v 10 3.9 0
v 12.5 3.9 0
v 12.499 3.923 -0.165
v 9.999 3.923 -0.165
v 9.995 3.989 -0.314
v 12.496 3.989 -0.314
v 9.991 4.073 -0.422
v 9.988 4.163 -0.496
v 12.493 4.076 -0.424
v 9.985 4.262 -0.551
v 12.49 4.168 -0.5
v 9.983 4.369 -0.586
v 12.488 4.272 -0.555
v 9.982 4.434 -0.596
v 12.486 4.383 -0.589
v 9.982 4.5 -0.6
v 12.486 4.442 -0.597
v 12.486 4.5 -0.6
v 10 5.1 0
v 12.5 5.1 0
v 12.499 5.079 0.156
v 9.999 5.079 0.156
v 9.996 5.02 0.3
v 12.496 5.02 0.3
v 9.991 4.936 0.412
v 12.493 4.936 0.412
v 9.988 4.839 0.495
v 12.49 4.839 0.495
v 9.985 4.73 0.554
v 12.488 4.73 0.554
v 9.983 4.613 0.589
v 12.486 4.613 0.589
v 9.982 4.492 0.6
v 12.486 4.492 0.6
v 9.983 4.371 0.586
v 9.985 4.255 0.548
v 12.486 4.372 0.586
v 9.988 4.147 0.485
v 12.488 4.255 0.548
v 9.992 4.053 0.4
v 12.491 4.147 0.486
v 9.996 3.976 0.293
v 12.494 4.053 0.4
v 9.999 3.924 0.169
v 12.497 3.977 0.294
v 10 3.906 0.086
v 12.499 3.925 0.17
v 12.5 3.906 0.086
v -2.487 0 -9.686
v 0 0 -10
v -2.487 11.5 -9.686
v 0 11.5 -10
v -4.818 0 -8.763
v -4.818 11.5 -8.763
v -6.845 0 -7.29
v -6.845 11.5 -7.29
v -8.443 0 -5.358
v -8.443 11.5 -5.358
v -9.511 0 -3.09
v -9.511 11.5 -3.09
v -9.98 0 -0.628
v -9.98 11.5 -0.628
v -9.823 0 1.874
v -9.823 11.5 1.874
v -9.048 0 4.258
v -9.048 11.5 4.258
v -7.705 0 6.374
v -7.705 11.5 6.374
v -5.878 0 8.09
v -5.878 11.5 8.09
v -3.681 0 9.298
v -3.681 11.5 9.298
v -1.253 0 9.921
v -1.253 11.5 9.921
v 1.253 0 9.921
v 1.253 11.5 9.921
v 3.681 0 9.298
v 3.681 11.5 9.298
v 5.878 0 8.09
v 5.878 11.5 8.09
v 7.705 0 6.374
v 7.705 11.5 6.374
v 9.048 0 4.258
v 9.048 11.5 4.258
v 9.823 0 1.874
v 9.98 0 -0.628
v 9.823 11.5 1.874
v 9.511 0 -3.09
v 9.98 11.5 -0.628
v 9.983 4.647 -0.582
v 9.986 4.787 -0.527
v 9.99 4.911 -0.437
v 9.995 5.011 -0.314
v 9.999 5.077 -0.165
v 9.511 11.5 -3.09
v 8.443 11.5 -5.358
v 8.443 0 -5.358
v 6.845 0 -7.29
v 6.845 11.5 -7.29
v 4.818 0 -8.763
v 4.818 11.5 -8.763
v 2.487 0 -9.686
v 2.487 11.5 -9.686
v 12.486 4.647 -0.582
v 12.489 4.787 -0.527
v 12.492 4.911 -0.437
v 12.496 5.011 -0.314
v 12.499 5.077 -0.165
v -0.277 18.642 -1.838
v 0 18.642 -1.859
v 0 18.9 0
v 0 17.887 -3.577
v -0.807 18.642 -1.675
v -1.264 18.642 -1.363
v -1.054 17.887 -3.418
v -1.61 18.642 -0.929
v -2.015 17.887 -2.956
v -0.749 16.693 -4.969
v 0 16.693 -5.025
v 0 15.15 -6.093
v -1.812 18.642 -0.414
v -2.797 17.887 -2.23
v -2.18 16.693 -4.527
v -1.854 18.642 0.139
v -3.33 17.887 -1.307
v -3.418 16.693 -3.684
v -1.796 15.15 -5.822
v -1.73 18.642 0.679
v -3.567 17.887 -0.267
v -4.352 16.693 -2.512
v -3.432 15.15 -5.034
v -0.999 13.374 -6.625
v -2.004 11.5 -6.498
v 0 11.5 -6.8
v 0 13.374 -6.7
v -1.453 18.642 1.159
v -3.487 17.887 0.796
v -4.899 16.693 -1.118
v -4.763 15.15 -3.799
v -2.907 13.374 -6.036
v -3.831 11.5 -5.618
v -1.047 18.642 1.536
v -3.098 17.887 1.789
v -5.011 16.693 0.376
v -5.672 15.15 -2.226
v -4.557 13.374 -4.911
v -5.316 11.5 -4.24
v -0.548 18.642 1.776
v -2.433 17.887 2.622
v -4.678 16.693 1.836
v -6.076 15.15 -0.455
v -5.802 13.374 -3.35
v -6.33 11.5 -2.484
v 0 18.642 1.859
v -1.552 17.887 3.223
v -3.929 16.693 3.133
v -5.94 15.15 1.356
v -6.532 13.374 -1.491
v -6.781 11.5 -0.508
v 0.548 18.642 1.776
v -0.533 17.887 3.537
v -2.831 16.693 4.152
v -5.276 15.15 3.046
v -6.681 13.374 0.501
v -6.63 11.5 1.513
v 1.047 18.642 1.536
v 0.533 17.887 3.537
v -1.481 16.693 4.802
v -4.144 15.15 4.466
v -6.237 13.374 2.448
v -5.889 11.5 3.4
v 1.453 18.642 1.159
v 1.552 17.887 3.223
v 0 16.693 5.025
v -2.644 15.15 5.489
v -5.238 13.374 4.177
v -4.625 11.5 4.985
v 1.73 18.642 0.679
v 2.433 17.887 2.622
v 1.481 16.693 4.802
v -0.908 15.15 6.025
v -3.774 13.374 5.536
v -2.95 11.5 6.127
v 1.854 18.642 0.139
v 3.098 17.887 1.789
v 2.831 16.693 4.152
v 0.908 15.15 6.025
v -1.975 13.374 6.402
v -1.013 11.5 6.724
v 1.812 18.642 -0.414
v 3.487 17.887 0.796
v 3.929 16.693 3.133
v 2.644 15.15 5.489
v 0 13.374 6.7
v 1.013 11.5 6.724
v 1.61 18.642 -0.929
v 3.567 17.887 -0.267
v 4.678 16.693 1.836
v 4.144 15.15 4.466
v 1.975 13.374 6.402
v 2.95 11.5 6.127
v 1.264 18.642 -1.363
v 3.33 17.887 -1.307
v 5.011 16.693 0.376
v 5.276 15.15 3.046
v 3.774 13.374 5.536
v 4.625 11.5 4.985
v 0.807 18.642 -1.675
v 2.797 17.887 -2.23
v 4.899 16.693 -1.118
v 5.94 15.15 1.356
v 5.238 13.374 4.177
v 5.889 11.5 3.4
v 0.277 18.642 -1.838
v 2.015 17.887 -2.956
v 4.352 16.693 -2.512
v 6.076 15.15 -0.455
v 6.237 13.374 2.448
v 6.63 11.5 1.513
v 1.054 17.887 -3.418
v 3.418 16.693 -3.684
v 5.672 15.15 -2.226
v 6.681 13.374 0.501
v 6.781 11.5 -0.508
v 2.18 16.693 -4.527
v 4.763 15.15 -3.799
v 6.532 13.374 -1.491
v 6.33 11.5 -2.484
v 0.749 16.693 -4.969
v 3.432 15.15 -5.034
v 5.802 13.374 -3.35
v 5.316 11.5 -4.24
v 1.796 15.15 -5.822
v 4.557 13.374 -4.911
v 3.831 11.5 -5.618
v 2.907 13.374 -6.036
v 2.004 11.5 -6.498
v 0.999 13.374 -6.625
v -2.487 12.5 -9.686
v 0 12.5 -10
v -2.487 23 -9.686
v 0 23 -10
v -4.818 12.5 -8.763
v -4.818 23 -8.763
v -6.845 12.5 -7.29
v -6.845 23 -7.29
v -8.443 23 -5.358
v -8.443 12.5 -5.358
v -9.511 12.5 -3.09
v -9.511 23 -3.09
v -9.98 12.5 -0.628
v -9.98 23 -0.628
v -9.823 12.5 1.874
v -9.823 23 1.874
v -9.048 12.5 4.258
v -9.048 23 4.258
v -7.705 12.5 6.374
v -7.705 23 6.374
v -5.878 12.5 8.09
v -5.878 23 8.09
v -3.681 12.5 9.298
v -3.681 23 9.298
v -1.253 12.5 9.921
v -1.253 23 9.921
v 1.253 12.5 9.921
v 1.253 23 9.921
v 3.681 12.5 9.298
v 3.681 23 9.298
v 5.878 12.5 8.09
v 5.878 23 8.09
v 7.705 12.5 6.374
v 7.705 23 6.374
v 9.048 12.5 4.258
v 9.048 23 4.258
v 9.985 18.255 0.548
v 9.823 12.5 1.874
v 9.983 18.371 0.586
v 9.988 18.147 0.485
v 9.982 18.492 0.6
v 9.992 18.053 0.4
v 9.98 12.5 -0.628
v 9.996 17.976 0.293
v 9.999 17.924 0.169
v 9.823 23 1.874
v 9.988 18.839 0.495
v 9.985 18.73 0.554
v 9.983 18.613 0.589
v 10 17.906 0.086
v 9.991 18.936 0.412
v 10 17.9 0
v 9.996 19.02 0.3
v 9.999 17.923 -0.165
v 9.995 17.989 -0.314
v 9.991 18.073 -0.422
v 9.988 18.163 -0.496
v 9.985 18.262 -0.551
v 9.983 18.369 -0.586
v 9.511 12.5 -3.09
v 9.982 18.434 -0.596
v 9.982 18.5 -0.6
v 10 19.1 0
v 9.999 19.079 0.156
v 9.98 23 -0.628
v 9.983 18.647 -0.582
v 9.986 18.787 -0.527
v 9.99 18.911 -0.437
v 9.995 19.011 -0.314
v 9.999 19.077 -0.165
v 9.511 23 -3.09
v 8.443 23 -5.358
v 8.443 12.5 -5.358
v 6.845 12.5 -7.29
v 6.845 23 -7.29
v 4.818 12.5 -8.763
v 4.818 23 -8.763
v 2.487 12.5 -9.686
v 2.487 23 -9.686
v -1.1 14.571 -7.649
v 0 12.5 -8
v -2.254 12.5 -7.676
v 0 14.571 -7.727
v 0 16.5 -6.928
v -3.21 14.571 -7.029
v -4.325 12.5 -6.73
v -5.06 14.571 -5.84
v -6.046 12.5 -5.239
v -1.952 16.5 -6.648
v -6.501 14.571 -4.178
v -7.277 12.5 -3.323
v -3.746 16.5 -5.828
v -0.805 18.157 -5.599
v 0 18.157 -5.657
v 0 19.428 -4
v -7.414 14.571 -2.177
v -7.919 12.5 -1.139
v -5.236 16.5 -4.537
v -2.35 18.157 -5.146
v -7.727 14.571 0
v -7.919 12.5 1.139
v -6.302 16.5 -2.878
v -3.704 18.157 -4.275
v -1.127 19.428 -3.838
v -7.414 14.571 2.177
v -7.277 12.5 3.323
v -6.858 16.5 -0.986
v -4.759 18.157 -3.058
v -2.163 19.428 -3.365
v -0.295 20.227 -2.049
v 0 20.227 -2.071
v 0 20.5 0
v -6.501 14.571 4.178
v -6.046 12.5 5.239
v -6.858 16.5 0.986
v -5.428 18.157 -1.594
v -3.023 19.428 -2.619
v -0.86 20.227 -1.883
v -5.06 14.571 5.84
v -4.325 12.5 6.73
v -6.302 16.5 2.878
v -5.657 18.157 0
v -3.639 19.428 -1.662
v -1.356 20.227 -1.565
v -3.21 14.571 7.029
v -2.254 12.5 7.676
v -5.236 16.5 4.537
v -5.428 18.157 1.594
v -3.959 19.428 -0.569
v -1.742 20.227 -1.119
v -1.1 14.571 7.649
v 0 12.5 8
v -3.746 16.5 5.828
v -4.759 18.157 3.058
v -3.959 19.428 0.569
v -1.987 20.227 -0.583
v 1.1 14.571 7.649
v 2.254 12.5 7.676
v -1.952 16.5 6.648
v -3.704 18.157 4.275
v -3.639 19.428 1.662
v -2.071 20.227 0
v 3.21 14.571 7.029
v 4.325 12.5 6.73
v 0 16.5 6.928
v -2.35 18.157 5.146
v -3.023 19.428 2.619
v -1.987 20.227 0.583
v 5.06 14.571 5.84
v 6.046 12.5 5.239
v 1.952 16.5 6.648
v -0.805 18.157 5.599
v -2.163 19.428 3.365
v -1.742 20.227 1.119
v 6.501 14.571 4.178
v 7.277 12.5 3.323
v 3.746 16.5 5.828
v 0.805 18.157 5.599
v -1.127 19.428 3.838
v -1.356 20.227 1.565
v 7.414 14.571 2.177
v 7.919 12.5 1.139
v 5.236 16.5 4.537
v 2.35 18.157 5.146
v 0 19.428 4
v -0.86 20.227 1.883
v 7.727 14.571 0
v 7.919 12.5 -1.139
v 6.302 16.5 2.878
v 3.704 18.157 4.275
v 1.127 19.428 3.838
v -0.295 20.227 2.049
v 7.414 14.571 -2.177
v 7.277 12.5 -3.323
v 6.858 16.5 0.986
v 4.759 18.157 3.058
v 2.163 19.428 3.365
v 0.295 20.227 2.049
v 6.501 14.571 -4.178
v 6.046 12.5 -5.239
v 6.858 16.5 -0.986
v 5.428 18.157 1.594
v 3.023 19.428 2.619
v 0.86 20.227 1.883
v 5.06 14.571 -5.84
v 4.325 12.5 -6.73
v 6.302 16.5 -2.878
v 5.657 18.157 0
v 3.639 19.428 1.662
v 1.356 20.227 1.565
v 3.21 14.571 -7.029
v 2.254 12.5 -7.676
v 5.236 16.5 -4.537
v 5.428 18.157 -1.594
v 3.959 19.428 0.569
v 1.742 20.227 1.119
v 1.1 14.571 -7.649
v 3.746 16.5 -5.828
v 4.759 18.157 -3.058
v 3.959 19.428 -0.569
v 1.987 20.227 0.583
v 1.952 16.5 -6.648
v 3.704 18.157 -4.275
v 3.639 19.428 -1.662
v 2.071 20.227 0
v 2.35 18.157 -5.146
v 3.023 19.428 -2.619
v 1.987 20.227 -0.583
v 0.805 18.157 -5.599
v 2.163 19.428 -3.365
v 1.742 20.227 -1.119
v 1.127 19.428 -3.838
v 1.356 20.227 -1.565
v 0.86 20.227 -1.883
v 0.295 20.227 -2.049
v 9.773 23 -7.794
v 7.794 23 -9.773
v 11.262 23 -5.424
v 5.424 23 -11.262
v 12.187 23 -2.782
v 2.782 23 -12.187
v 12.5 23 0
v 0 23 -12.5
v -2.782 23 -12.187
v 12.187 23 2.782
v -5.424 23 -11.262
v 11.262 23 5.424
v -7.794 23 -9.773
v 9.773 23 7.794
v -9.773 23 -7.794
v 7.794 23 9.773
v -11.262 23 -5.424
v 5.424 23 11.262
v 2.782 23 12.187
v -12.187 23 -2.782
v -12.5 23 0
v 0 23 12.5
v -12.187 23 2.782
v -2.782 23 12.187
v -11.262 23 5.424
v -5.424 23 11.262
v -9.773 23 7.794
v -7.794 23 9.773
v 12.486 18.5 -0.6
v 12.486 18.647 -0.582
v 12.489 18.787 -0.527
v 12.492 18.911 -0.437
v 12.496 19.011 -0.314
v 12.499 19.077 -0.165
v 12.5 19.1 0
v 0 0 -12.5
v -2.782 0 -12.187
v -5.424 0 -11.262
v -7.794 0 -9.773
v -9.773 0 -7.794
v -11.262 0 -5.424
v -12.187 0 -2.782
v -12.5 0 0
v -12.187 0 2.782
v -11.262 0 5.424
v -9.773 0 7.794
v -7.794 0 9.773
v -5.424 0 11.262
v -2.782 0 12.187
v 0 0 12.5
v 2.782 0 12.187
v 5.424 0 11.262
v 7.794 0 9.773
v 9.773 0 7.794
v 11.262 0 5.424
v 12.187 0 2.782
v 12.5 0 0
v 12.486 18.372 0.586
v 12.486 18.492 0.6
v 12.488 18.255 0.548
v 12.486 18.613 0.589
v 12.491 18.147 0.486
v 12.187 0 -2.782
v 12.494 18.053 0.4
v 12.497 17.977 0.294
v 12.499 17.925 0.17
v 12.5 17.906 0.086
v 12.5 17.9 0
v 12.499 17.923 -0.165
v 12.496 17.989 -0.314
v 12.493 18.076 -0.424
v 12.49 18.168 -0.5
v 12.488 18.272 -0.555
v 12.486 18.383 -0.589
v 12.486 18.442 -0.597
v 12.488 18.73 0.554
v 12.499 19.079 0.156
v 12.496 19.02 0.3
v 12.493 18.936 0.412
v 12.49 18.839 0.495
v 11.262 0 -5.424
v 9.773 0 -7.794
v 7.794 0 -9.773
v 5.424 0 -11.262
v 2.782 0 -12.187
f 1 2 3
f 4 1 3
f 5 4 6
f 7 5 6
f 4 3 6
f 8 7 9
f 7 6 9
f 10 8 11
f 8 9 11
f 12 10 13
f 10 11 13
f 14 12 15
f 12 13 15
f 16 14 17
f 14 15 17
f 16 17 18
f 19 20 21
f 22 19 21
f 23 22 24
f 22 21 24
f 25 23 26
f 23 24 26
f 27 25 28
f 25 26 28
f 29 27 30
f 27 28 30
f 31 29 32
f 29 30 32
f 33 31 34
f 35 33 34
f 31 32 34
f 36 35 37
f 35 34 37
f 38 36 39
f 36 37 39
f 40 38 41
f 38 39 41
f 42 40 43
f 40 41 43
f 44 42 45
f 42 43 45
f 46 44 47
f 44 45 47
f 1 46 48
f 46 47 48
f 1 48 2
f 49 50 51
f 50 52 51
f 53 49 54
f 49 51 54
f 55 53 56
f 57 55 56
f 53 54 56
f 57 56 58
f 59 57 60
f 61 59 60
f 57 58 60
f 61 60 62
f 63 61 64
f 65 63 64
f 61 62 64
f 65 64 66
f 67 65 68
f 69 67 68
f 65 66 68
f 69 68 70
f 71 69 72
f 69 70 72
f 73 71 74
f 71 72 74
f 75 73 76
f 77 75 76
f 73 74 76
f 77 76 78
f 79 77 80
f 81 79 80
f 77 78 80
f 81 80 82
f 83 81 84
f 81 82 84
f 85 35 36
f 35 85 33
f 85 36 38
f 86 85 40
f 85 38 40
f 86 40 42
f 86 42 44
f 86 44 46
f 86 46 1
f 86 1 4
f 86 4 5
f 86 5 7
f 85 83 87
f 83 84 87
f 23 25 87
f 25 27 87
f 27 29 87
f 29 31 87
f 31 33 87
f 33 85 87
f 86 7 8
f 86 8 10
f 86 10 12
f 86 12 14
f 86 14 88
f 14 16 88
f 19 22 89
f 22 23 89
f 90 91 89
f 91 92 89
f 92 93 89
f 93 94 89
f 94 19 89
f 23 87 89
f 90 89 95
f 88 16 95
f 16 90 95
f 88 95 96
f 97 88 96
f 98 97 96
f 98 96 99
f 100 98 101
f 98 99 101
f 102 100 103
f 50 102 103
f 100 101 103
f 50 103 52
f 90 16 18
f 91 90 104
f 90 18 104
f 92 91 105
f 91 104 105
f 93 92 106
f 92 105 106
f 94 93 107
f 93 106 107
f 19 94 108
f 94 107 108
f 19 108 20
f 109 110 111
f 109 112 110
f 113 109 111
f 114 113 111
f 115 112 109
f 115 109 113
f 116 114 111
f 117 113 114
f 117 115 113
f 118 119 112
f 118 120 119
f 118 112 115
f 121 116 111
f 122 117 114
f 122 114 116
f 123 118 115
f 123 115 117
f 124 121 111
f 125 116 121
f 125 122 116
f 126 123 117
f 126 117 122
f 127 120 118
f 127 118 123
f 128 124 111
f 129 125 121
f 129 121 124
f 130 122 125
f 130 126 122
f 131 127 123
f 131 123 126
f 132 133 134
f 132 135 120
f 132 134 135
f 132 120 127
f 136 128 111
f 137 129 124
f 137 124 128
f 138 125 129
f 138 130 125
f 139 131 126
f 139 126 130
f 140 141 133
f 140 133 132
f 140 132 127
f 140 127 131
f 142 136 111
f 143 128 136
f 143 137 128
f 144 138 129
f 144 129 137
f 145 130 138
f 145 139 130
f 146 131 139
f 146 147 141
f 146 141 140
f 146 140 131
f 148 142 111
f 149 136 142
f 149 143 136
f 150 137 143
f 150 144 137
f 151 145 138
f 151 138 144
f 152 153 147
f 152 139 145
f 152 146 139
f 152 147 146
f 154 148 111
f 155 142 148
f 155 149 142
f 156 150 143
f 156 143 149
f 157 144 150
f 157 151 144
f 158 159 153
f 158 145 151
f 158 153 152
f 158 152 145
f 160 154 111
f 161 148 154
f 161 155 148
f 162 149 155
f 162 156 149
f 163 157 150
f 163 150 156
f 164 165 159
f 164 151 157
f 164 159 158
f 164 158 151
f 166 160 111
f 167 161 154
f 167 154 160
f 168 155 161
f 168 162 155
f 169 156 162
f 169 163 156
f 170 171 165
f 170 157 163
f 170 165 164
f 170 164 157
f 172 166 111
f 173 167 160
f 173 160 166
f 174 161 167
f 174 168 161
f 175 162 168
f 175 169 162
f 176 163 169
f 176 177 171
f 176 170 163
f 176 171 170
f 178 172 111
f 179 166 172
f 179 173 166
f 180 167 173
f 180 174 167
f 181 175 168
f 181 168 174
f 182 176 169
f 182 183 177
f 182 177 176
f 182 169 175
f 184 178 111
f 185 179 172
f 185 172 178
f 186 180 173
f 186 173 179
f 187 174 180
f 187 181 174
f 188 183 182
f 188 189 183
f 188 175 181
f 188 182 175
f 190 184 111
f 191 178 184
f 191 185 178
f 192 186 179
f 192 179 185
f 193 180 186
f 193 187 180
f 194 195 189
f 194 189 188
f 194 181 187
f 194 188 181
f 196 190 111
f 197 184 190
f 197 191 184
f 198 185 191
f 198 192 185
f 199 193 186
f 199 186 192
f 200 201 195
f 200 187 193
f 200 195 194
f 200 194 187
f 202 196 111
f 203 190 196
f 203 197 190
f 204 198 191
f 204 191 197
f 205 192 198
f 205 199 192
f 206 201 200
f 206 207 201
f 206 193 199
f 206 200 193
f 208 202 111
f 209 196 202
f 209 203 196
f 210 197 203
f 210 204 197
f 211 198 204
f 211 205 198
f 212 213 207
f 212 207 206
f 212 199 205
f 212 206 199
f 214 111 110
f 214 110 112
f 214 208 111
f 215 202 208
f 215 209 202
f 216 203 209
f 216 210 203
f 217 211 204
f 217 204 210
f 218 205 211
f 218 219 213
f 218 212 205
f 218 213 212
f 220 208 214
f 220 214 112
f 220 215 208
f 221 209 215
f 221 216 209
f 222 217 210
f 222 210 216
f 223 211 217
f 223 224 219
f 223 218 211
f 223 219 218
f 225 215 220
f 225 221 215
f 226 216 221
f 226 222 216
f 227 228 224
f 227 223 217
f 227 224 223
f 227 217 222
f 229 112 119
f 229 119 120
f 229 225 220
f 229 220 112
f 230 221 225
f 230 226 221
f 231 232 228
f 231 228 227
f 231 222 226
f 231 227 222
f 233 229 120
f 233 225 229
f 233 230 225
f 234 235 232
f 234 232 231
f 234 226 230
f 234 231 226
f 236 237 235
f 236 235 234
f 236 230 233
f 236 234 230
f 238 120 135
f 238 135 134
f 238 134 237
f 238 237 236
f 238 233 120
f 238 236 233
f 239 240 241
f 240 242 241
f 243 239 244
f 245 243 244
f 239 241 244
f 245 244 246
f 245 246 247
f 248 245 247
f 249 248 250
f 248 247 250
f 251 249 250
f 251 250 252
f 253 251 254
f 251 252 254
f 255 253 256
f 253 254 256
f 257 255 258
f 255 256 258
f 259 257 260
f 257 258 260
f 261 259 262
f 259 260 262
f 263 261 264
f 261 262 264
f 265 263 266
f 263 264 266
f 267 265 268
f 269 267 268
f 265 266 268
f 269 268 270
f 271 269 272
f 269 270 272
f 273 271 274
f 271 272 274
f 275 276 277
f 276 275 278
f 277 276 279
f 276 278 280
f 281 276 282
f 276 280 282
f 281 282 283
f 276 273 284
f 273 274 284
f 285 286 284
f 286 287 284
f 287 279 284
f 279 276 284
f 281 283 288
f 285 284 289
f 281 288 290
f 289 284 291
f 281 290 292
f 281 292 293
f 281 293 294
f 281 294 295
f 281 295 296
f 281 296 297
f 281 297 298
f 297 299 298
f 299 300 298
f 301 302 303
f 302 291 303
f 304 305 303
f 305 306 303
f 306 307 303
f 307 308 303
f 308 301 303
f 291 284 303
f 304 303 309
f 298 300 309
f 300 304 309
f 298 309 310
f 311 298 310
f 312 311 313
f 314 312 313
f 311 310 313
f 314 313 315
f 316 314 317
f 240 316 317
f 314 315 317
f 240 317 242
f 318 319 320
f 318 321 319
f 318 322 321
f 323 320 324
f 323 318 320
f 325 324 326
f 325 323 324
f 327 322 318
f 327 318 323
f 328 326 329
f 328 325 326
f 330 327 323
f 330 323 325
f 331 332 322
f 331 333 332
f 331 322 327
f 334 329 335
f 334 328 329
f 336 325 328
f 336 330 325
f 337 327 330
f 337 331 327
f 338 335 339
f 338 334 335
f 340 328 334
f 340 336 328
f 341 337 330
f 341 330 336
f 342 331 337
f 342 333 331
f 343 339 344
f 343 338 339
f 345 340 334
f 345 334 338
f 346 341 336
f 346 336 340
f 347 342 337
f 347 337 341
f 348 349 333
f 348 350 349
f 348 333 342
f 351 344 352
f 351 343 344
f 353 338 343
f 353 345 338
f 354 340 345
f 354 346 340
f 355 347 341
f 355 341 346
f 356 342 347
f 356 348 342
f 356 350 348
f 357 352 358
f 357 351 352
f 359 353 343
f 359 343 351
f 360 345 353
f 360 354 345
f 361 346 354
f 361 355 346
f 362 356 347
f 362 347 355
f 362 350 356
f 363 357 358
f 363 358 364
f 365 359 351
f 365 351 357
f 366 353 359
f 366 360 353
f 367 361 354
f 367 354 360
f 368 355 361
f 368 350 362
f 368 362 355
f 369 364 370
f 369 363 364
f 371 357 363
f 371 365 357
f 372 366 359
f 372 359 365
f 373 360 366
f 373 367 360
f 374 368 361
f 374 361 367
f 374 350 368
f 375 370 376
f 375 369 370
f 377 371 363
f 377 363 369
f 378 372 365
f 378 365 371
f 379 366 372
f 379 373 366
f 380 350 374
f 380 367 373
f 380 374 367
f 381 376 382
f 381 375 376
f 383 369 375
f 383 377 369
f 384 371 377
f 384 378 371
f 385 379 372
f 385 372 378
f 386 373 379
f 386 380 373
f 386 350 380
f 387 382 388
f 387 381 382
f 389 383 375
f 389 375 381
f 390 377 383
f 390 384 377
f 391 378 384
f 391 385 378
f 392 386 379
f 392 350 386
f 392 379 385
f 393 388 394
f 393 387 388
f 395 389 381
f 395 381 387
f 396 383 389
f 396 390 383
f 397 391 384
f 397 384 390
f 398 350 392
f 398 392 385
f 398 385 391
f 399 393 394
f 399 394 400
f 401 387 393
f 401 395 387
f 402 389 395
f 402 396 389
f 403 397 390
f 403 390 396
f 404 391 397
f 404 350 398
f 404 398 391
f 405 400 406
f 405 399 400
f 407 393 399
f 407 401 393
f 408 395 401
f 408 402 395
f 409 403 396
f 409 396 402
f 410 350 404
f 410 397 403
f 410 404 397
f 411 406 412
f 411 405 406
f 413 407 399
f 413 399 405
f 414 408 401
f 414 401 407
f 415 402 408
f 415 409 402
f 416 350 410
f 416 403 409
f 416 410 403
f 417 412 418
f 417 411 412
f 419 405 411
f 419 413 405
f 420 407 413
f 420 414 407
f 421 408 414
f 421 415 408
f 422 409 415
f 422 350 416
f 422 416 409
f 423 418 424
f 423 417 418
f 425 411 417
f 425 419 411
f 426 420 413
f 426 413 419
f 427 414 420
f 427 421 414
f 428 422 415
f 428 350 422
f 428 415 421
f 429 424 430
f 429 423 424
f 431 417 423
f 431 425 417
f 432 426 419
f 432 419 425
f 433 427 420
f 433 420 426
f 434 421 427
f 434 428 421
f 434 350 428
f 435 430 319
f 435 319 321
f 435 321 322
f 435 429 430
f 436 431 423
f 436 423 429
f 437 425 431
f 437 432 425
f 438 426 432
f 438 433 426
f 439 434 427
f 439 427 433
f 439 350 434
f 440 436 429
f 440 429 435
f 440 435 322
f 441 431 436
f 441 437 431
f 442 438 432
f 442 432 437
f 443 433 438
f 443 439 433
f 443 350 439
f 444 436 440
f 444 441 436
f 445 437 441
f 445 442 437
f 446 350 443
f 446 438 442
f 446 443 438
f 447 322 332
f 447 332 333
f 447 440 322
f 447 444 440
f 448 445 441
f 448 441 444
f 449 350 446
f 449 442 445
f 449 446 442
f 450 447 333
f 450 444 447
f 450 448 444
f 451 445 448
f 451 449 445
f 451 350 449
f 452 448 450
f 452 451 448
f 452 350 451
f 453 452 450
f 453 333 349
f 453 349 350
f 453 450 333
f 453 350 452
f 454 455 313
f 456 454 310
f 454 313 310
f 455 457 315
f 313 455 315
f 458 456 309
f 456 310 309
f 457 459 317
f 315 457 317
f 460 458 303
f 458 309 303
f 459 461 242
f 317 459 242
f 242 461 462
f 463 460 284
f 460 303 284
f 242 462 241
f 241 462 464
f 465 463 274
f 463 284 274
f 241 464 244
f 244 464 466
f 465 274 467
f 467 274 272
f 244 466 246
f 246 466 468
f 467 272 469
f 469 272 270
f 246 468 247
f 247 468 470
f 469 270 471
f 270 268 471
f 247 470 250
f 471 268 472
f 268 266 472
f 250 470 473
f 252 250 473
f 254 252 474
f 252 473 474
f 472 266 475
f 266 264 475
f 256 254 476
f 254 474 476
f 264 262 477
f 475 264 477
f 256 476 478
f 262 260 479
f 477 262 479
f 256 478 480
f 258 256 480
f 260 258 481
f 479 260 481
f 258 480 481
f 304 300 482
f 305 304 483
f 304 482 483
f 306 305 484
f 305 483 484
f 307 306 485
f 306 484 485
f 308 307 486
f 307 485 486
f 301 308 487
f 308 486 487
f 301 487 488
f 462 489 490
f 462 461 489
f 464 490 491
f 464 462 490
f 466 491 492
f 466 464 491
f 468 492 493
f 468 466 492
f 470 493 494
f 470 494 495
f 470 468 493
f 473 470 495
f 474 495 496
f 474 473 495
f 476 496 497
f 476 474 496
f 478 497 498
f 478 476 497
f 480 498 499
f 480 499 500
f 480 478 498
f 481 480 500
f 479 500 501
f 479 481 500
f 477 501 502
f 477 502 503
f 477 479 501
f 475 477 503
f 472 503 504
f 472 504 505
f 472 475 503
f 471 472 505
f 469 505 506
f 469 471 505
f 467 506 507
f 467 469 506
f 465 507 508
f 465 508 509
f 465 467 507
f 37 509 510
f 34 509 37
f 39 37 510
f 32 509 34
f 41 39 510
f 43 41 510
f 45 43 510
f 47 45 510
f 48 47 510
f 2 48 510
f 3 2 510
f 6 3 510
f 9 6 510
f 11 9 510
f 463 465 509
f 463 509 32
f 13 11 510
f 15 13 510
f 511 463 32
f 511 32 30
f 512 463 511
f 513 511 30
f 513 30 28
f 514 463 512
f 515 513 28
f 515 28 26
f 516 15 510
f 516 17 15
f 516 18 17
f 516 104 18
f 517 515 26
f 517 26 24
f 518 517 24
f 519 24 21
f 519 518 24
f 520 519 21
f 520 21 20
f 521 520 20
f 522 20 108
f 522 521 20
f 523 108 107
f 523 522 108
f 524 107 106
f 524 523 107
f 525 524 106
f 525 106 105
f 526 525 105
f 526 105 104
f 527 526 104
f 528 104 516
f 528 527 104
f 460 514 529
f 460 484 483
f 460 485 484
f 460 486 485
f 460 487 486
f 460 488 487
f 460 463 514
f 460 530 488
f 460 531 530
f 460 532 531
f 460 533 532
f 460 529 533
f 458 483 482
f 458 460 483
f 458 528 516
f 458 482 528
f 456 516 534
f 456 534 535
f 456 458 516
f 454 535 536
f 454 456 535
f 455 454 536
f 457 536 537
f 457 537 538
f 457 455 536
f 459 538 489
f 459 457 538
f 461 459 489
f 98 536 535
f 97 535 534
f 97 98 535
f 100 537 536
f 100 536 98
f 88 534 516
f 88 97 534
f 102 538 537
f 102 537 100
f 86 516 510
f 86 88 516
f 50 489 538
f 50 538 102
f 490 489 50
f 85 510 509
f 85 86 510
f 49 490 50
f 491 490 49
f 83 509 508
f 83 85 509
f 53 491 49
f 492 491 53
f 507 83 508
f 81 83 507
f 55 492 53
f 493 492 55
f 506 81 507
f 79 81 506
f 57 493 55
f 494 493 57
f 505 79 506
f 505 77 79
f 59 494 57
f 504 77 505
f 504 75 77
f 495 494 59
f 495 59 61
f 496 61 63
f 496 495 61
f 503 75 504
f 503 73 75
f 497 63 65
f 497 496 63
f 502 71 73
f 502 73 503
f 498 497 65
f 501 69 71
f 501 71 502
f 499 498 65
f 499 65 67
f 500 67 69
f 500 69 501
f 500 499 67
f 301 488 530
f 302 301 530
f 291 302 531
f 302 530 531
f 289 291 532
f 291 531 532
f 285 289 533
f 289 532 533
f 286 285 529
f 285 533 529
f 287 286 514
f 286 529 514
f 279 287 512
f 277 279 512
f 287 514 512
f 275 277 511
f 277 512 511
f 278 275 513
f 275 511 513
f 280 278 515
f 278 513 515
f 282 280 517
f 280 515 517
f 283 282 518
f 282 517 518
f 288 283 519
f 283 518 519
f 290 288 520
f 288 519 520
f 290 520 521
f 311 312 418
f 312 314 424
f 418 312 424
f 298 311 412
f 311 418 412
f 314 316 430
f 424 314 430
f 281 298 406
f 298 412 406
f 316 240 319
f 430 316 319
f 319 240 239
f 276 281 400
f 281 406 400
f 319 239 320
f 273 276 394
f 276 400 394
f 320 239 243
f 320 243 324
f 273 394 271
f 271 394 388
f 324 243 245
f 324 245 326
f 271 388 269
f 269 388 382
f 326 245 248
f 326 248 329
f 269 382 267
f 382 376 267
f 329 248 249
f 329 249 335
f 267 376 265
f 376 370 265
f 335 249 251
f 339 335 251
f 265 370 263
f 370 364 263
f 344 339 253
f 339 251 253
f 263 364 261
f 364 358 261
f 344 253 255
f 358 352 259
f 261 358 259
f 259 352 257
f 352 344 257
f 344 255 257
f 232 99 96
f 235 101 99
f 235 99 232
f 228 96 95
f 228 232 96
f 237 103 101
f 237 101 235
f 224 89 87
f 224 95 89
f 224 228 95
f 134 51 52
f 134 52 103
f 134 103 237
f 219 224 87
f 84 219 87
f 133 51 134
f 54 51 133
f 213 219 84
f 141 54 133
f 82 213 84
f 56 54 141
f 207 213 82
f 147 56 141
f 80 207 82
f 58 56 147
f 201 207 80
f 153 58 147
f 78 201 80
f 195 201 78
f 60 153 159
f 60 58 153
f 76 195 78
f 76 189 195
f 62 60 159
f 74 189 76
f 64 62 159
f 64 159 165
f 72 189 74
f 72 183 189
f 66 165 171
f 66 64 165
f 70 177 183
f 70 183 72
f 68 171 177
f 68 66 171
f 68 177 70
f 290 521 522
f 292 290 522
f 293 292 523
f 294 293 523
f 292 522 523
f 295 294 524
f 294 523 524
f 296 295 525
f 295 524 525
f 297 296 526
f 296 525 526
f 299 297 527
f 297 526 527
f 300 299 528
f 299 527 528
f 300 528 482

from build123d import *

# Parameters (mm, degrees)
SKETCH1_W               = 2
SKETCH1_H               = 1
SKETCH1_W_2             = 2.5
SKETCH1_H_2             = 23
CUT_EXTRUDE1_REACH      = 38.197
CUT_EXTRUDE1_END_RADIUS = 10


with BuildPart() as part:
    # Sketch1 → Revolve1 (revolve)
    with BuildSketch(Plane.XY, mode=Mode.PRIVATE) as revolve1_sk:
        with BuildLine():
            Line((0, 20.5), (0, 18.9))
            ThreePointArc((0, 18.9), (5.024937811, 16.693186096), (6.8, 11.5))
            Line((6.8, 11.5), (8, 11.5))
            Line((8, 11.5), (8, 12.5))
            ThreePointArc((8, 12.5), (5.656854249, 18.156854249), (0, 20.5))
        make_face()
        with Locations((9, 12)):
            Rectangle(SKETCH1_W, SKETCH1_H)
        with Locations((11.25, 11.5)):
            Rectangle(SKETCH1_W_2, SKETCH1_H_2)
    revolve(revolve1_sk.sketch.rotate(Axis((0, 0, 0), (0, 1, 0)), 90), axis=Axis((0, 0, 0), (0, 1, 0)))

    # Cut-Extrude1: up to this cylinder (the profile starts outside it)
    cut_extrude1_end = Plane(origin=(0, 11.5, 0), z_dir=(0, -1, 0)) * Cylinder(CUT_EXTRUDE1_END_RADIUS, 111.394, mode=Mode.PRIVATE)
    # Sketch2 → Cut-Extrude1 (cut, up to the surface)
    with BuildSketch(Plane(origin=(12.5, 0, 0), x_dir=(0, 0, -1), z_dir=(1, 0, 0)), mode=Mode.PRIVATE) as cut_extrude1_sk1:
        with BuildLine():
            ThreePointArc((0, 19.1), (-0.6, 18.5), (0, 17.9))
            Line((0, 17.9), (0, 19.1))
        make_face()
    cut_extrude1_tool1 = extrude(cut_extrude1_sk1.sketch, amount=-CUT_EXTRUDE1_REACH, mode=Mode.PRIVATE) - cut_extrude1_end
    add(cut_extrude1_tool1.solids().sort_by_distance((12.5, 18.5, 0.254648))[0], mode=Mode.SUBTRACT)
    # Sketch2 → Cut-Extrude1 (cut, up to the surface)
    with BuildSketch(Plane(origin=(12.5, 0, 0), x_dir=(0, 0, -1), z_dir=(1, 0, 0)), mode=Mode.PRIVATE) as cut_extrude1_sk2:
        with BuildLine():
            Line((0, 19.1), (0, 17.9))
            ThreePointArc((0, 17.9), (0.424264069, 18.075735931), (0.6, 18.5))
            ThreePointArc((0.6, 18.5), (0.424264069, 18.924264069), (0, 19.1))
        make_face()
    cut_extrude1_tool2 = extrude(cut_extrude1_sk2.sketch, amount=-CUT_EXTRUDE1_REACH, mode=Mode.PRIVATE) - cut_extrude1_end
    add(cut_extrude1_tool2.solids().sort_by_distance((12.5, 18.5, -0.254648))[0], mode=Mode.SUBTRACT)
    # Sketch2 → Cut-Extrude1 (cut, up to the surface)
    with BuildSketch(Plane(origin=(12.5, 0, 0), x_dir=(0, 0, -1), z_dir=(1, 0, 0)), mode=Mode.PRIVATE) as cut_extrude1_sk3:
        with BuildLine():
            ThreePointArc((0, 19.1), (-0.6, 18.5), (0, 17.9))
            Line((0, 17.9), (0, 19.1))
        make_face()
    cut_extrude1_tool3 = extrude(cut_extrude1_sk3.sketch, amount=-CUT_EXTRUDE1_REACH, mode=Mode.PRIVATE) - cut_extrude1_end
    add(cut_extrude1_tool3.solids().sort_by_distance((12.5, 18.5, 0.254648))[0], mode=Mode.SUBTRACT)
    # Sketch2 → Cut-Extrude1 (cut, up to the surface)
    with BuildSketch(Plane(origin=(12.5, 0, 0), x_dir=(0, 0, -1), z_dir=(1, 0, 0)), mode=Mode.PRIVATE) as cut_extrude1_sk4:
        with BuildLine():
            Line((0, 19.1), (0, 17.9))
            ThreePointArc((0, 17.9), (0.424264069, 18.075735931), (0.6, 18.5))
            ThreePointArc((0.6, 18.5), (0.424264069, 18.924264069), (0, 19.1))
        make_face()
    cut_extrude1_tool4 = extrude(cut_extrude1_sk4.sketch, amount=-CUT_EXTRUDE1_REACH, mode=Mode.PRIVATE) - cut_extrude1_end
    add(cut_extrude1_tool4.solids().sort_by_distance((12.5, 18.5, -0.254648))[0], mode=Mode.SUBTRACT)
    # Sketch2 → Cut-Extrude1 (cut, up to the surface)
    with BuildSketch(Plane(origin=(12.5, 0, 0), x_dir=(0, 0, -1), z_dir=(1, 0, 0)), mode=Mode.PRIVATE) as cut_extrude1_sk5:
        with BuildLine():
            ThreePointArc((0, 5.1), (-0.6, 4.5), (0, 3.9))
            Line((0, 3.9), (0, 5.1))
        make_face()
    cut_extrude1_tool5 = extrude(cut_extrude1_sk5.sketch, amount=-CUT_EXTRUDE1_REACH, mode=Mode.PRIVATE) - cut_extrude1_end
    add(cut_extrude1_tool5.solids().sort_by_distance((12.5, 4.5, 0.254648))[0], mode=Mode.SUBTRACT)
    # Sketch2 → Cut-Extrude1 (cut, up to the surface)
    with BuildSketch(Plane(origin=(12.5, 0, 0), x_dir=(0, 0, -1), z_dir=(1, 0, 0)), mode=Mode.PRIVATE) as cut_extrude1_sk6:
        with BuildLine():
            Line((0, 5.1), (0, 3.9))
            ThreePointArc((0, 3.9), (0.424264069, 4.075735931), (0.6, 4.5))
            ThreePointArc((0.6, 4.5), (0.424264069, 4.924264069), (0, 5.1))
        make_face()
    cut_extrude1_tool6 = extrude(cut_extrude1_sk6.sketch, amount=-CUT_EXTRUDE1_REACH, mode=Mode.PRIVATE) - cut_extrude1_end
    add(cut_extrude1_tool6.solids().sort_by_distance((12.5, 4.5, -0.254648))[0], mode=Mode.SUBTRACT)
    # Sketch2 → Cut-Extrude1 (cut, up to the surface)
    with BuildSketch(Plane(origin=(12.5, 0, 0), x_dir=(0, 0, -1), z_dir=(1, 0, 0)), mode=Mode.PRIVATE) as cut_extrude1_sk7:
        with BuildLine():
            ThreePointArc((0, 5.1), (-0.6, 4.5), (0, 3.9))
            Line((0, 3.9), (0, 5.1))
        make_face()
    cut_extrude1_tool7 = extrude(cut_extrude1_sk7.sketch, amount=-CUT_EXTRUDE1_REACH, mode=Mode.PRIVATE) - cut_extrude1_end
    add(cut_extrude1_tool7.solids().sort_by_distance((12.5, 4.5, 0.254648))[0], mode=Mode.SUBTRACT)
    # Sketch2 → Cut-Extrude1 (cut, up to the surface)
    with BuildSketch(Plane(origin=(12.5, 0, 0), x_dir=(0, 0, -1), z_dir=(1, 0, 0)), mode=Mode.PRIVATE) as cut_extrude1_sk8:
        with BuildLine():
            Line((0, 5.1), (0, 3.9))
            ThreePointArc((0, 3.9), (0.424264069, 4.075735931), (0.6, 4.5))
            ThreePointArc((0.6, 4.5), (0.424264069, 4.924264069), (0, 5.1))
        make_face()
    cut_extrude1_tool8 = extrude(cut_extrude1_sk8.sketch, amount=-CUT_EXTRUDE1_REACH, mode=Mode.PRIVATE) - cut_extrude1_end
    add(cut_extrude1_tool8.solids().sort_by_distance((12.5, 4.5, -0.254648))[0], mode=Mode.SUBTRACT)


solid = part.part
